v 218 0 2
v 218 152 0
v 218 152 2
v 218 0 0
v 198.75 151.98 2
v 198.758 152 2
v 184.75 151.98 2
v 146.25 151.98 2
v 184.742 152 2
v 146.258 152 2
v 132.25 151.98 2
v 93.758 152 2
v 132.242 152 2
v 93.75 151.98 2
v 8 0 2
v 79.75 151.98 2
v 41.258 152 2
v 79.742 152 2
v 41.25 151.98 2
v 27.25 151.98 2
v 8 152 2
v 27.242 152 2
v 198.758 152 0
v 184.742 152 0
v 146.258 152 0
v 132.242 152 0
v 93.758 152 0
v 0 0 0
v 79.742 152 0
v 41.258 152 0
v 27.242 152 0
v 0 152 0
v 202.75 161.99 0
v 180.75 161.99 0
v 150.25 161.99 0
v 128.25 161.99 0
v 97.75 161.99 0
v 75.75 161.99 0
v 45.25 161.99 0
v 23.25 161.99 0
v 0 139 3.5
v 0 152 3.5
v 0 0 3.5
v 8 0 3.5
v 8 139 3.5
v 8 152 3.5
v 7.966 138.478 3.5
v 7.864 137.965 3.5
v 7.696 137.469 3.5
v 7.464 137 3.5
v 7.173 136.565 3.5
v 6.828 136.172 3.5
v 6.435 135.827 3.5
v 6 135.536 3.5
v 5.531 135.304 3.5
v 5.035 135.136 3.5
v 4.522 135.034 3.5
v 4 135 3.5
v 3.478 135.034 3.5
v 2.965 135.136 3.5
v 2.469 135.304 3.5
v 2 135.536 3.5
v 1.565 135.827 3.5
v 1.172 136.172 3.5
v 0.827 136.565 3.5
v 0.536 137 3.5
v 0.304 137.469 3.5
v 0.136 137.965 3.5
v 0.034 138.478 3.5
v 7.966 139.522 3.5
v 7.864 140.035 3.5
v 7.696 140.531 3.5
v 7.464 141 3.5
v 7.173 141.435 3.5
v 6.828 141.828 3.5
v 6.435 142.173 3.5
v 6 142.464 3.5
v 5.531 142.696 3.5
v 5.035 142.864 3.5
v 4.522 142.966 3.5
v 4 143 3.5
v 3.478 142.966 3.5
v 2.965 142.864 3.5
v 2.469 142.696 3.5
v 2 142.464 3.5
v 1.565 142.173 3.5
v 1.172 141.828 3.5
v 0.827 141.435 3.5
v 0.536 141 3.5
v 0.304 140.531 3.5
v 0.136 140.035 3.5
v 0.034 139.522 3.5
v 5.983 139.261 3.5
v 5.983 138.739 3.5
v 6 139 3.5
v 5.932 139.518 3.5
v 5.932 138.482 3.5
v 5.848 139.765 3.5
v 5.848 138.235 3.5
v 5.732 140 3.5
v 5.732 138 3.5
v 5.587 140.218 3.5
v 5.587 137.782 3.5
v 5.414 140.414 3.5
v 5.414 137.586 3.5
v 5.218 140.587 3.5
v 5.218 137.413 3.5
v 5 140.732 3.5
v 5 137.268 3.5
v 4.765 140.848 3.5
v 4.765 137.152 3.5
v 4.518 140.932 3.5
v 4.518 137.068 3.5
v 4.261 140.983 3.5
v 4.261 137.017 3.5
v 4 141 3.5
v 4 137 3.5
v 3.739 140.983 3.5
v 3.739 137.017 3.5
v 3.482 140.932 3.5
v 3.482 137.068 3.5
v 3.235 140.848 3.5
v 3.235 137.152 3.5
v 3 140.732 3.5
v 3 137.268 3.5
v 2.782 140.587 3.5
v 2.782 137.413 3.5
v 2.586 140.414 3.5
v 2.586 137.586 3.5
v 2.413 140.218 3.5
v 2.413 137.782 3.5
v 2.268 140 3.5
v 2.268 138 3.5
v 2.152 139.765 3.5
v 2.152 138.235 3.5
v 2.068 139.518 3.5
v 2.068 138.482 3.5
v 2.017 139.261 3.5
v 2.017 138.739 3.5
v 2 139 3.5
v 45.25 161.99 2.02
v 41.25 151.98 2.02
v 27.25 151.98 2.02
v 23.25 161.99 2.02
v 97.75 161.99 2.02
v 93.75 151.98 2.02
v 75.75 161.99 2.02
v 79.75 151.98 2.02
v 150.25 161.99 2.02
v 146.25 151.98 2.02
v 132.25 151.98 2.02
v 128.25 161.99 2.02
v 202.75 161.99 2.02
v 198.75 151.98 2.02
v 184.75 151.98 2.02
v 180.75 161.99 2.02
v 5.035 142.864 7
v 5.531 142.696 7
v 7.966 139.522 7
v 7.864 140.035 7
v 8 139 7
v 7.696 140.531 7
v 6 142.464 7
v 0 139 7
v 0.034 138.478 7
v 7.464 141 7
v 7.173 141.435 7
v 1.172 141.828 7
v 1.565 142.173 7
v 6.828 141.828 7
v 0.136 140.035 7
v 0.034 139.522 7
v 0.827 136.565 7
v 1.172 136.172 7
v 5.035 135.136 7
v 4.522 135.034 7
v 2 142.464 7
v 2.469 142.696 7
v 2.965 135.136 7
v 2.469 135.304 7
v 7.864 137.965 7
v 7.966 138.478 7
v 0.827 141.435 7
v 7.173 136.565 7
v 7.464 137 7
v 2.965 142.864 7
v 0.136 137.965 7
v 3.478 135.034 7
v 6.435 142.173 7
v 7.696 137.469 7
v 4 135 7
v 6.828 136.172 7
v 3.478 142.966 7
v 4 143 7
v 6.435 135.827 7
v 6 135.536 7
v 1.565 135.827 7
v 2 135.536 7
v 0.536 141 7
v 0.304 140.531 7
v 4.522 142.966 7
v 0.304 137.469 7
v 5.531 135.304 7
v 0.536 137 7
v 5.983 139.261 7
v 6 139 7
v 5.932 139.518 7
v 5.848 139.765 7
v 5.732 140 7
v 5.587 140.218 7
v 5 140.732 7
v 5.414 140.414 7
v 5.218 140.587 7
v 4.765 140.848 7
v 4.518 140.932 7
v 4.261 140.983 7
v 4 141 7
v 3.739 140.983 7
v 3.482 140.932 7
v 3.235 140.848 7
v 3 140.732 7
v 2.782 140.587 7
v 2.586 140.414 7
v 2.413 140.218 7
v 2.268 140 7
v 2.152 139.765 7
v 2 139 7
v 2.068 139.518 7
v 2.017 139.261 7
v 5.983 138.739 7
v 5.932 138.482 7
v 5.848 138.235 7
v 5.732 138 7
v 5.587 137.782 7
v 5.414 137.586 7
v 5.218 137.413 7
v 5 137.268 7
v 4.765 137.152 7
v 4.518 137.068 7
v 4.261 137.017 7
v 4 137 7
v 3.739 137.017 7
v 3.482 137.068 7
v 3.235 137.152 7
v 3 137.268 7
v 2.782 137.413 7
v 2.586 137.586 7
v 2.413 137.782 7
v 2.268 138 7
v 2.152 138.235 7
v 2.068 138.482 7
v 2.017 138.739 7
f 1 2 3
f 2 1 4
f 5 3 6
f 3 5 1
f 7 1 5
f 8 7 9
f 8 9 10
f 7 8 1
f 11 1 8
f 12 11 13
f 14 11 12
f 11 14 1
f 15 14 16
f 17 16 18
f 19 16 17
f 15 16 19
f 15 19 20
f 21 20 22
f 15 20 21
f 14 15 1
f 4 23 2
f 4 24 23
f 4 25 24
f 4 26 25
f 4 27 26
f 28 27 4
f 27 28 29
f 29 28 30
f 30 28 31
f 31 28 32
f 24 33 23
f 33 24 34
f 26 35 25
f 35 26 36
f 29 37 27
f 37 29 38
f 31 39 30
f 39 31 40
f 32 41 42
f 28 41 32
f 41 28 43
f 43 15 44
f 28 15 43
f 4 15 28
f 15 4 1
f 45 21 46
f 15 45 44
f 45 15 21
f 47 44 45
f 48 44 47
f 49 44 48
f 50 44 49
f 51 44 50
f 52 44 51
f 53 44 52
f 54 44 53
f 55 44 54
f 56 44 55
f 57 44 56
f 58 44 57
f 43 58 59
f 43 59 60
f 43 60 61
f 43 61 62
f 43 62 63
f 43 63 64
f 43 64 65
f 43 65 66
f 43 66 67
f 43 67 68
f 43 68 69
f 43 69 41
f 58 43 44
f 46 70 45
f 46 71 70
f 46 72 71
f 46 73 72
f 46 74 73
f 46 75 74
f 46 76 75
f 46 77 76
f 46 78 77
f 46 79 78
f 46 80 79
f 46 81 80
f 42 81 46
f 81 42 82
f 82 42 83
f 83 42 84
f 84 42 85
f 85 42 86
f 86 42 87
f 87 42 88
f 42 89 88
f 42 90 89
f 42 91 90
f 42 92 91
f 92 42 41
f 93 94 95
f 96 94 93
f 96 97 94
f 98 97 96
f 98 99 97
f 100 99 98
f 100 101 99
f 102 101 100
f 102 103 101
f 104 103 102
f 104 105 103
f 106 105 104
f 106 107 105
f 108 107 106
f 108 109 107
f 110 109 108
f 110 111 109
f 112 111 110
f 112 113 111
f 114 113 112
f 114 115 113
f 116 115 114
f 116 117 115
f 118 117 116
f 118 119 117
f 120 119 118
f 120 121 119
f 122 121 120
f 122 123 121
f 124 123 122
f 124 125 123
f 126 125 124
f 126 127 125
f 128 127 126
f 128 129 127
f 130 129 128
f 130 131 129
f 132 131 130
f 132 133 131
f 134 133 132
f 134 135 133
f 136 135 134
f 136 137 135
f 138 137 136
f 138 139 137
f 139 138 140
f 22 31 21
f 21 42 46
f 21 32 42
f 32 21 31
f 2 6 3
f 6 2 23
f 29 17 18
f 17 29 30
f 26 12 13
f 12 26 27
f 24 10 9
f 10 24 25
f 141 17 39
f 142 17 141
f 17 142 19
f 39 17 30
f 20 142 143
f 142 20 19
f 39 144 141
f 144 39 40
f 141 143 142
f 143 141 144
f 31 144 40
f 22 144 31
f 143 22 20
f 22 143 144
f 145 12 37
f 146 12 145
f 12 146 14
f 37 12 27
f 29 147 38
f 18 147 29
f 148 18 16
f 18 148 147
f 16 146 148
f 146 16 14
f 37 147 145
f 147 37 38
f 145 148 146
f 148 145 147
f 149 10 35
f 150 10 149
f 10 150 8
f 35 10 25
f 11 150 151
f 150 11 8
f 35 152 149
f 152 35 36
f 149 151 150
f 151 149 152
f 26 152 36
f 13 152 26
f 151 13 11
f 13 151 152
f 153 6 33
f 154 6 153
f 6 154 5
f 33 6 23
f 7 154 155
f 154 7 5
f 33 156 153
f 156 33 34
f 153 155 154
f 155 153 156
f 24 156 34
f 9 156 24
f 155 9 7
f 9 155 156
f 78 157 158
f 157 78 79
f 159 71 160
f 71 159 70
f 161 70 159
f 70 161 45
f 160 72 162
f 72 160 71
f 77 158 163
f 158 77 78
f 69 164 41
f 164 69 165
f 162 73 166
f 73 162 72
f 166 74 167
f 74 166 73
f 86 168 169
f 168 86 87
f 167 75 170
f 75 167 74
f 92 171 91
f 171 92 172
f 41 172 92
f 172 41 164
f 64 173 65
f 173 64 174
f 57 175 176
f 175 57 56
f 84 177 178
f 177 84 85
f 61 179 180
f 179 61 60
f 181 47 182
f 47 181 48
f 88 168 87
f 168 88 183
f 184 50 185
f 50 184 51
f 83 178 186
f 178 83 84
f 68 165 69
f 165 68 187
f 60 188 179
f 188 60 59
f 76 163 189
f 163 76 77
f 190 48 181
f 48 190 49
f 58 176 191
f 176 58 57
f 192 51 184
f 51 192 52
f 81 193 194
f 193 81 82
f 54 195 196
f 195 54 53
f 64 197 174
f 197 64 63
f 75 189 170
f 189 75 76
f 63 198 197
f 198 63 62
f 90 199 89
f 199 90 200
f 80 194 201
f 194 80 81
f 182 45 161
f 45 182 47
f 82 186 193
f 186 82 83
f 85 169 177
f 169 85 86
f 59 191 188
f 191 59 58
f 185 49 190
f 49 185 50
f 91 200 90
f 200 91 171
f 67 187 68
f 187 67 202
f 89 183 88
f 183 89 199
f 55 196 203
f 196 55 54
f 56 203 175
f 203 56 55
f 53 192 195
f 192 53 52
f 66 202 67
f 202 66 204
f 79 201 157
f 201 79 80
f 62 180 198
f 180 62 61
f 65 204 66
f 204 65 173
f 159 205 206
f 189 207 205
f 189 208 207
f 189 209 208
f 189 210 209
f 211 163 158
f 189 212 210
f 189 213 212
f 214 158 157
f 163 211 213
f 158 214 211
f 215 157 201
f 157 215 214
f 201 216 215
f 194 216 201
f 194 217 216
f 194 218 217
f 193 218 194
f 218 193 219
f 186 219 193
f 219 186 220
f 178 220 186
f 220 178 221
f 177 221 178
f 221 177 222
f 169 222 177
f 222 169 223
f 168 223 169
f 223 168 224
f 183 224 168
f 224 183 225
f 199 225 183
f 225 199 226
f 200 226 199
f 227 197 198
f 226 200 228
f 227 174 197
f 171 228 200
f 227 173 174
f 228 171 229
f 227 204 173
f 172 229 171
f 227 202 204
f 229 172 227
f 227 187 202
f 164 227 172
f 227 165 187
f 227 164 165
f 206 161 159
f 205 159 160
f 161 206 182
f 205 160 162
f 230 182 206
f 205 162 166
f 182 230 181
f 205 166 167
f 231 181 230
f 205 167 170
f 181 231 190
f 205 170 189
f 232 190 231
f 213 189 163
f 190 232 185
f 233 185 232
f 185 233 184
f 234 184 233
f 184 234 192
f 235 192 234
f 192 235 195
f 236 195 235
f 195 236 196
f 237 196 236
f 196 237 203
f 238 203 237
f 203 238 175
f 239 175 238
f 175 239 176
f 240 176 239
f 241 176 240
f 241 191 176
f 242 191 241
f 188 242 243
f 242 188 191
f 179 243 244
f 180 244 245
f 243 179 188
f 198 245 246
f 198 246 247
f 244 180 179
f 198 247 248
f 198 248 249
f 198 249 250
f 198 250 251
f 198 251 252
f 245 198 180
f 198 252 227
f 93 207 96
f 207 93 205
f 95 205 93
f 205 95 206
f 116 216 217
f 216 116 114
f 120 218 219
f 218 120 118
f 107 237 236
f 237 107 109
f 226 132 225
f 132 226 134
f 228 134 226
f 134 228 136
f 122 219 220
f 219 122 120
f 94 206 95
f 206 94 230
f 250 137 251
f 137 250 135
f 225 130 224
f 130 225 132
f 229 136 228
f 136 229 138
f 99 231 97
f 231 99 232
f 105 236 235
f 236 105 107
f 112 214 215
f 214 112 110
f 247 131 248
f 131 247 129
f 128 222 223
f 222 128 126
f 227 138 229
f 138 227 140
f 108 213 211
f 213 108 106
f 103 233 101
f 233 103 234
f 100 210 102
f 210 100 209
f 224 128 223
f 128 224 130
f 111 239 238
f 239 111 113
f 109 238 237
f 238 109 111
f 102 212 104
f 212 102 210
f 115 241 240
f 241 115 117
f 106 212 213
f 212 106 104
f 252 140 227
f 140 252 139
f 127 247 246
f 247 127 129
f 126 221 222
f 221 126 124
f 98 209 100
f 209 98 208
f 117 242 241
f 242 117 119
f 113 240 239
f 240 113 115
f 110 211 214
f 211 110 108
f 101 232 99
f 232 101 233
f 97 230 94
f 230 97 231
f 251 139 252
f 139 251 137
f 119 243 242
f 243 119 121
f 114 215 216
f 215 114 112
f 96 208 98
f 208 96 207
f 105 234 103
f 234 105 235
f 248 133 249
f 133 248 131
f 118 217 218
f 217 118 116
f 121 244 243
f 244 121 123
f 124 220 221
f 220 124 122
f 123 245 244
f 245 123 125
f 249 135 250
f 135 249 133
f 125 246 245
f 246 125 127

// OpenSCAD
// Trägerplatte für A4 (Handschrift-Plotter, "Weg A": der Drucker verschiebt die Platte selbst)
//
// Idee: Das Blatt liegt fest auf dieser Platte, die Platte liegt lose auf dem Bett.
// Zum Weiterschieben senkt der Druckkopf eine M3-Schraube (am Stifthalter) in die Buchse,
// dann fährt das Bett 100 mm. Die Platte wird festgehalten, das Bett gleitet darunter weg.
//
// Aufbau (u = quer / Drucker-X, v = längs / Drucker-Y, v = 0 ist die VORDERKANTE):
//   - Platte 218 × 304 × 2 mm, aus 2 Hälften (je 218 × 152) mit Schwalbenschwänzen
//   - links ein 8 mm breiter, 1,5 mm hoher Randstreifen = Anschlag für die linke Blattkante;
//     auf ihm sitzt die Buchse (hier wird nie geschrieben)
//   - hinten eine 1,5 mm hohe Leiste = Anschlag für die Oberkante des Blatts
//   - Blatt (210 × 297) liegt mit Oberkante an der hinteren Leiste, linker Kante am Streifen
//
// Export:  openscad -D teil=1 -o traegerplatte_1.stl traegerplatte.scad   (vordere Hälfte, mit Buchse)
//          openscad -D teil=2 -o traegerplatte_2.stl traegerplatte.scad   (hintere Hälfte)
// Druck: flach, glatte Unterseite aufs Bett (die wird später auf dem Druckbett gleiten), PLA,
//        0,2 mm, 100 % Infill ist bei 2 mm egal; KEIN Brim (Teil ist 218 mm breit).

teil = 1;            // 1 = vorne (mit Buchse), 2 = hinten, 0 = beide zusammengesetzt (Ansicht)

breite   = 218;
laenge   = 304;
dicke    = 2;
streifen = 8;        // linker Randstreifen
anschlag_h = 1.5;    // Höhe von Streifen und hinterer Leiste über der Platte
leiste   = 3.5;      // Tiefe der hinteren Leiste
teilung  = laenge / 2;

buchse_v = 139;      // Lage der Buchse ab Vorderkante (passt zu verschiebe_test.gcode)
buchse_d = 8;
buchse_h = 5;        // Höhe über der Platte
buchse_loch = 4;     // M3-Schraube Ø 3 + Spiel

// Schwalbenschwänze an der Teilung
sw_n     = 4;
sw_breit = 14;       // schmale Seite
sw_spreiz = 4;       // pro Seite breiter am Ende
sw_tief  = 10;
sw_spiel = 0.2;

$fn = 48;

module schwalbe(s = 0) {   // ein Zapfen, s = Spiel (für die Aussparung)
    linear_extrude(dicke + 0.02)
        polygon([[-sw_breit / 2 - s, -0.01], [sw_breit / 2 + s, -0.01],
                 [sw_breit / 2 + sw_spreiz + s, sw_tief + s], [-sw_breit / 2 - sw_spreiz - s, sw_tief + s]]);
}

function sw_u(i) = streifen + (breite - streifen) * (i + 0.5) / sw_n;

module platte_ganz() {
    cube([breite, laenge, dicke]);
    translate([0, 0, dicke - 0.01]) cube([streifen, laenge, anschlag_h + 0.01]);           // linker Streifen
    translate([0, laenge - leiste, dicke - 0.01]) cube([breite, leiste, anschlag_h + 0.01]); // hintere Leiste
}

module buchse() {
    translate([streifen / 2, buchse_v, dicke])
        difference() {
            cylinder(d = buchse_d, h = buchse_h);
            translate([0, 0, 0.8]) cylinder(d = buchse_loch, h = buchse_h);
        }
}

module vorne() {   // v = 0 … teilung, plus Zapfen nach hinten
    difference() {
        intersection() { platte_ganz(); translate([-1, -1, -1]) cube([breite + 2, teilung + 1, 20]); }
    }
    for (i = [0 : sw_n - 1]) translate([sw_u(i), teilung - 0.01, 0]) schwalbe();
    if (buchse_v < teilung - buchse_d) buchse();
}

module hinten() {
    difference() {
        intersection() { platte_ganz(); translate([-1, teilung, -1]) cube([breite + 2, laenge, 20]); }
        for (i = [0 : sw_n - 1]) translate([sw_u(i), teilung - 0.01, -0.01]) schwalbe(sw_spiel);
    }
    if (buchse_v >= teilung + buchse_d) buchse();
}

if (teil == 1) vorne();
else if (teil == 2) translate([0, -teilung, 0]) hinten();
else { vorne(); hinten(); }
